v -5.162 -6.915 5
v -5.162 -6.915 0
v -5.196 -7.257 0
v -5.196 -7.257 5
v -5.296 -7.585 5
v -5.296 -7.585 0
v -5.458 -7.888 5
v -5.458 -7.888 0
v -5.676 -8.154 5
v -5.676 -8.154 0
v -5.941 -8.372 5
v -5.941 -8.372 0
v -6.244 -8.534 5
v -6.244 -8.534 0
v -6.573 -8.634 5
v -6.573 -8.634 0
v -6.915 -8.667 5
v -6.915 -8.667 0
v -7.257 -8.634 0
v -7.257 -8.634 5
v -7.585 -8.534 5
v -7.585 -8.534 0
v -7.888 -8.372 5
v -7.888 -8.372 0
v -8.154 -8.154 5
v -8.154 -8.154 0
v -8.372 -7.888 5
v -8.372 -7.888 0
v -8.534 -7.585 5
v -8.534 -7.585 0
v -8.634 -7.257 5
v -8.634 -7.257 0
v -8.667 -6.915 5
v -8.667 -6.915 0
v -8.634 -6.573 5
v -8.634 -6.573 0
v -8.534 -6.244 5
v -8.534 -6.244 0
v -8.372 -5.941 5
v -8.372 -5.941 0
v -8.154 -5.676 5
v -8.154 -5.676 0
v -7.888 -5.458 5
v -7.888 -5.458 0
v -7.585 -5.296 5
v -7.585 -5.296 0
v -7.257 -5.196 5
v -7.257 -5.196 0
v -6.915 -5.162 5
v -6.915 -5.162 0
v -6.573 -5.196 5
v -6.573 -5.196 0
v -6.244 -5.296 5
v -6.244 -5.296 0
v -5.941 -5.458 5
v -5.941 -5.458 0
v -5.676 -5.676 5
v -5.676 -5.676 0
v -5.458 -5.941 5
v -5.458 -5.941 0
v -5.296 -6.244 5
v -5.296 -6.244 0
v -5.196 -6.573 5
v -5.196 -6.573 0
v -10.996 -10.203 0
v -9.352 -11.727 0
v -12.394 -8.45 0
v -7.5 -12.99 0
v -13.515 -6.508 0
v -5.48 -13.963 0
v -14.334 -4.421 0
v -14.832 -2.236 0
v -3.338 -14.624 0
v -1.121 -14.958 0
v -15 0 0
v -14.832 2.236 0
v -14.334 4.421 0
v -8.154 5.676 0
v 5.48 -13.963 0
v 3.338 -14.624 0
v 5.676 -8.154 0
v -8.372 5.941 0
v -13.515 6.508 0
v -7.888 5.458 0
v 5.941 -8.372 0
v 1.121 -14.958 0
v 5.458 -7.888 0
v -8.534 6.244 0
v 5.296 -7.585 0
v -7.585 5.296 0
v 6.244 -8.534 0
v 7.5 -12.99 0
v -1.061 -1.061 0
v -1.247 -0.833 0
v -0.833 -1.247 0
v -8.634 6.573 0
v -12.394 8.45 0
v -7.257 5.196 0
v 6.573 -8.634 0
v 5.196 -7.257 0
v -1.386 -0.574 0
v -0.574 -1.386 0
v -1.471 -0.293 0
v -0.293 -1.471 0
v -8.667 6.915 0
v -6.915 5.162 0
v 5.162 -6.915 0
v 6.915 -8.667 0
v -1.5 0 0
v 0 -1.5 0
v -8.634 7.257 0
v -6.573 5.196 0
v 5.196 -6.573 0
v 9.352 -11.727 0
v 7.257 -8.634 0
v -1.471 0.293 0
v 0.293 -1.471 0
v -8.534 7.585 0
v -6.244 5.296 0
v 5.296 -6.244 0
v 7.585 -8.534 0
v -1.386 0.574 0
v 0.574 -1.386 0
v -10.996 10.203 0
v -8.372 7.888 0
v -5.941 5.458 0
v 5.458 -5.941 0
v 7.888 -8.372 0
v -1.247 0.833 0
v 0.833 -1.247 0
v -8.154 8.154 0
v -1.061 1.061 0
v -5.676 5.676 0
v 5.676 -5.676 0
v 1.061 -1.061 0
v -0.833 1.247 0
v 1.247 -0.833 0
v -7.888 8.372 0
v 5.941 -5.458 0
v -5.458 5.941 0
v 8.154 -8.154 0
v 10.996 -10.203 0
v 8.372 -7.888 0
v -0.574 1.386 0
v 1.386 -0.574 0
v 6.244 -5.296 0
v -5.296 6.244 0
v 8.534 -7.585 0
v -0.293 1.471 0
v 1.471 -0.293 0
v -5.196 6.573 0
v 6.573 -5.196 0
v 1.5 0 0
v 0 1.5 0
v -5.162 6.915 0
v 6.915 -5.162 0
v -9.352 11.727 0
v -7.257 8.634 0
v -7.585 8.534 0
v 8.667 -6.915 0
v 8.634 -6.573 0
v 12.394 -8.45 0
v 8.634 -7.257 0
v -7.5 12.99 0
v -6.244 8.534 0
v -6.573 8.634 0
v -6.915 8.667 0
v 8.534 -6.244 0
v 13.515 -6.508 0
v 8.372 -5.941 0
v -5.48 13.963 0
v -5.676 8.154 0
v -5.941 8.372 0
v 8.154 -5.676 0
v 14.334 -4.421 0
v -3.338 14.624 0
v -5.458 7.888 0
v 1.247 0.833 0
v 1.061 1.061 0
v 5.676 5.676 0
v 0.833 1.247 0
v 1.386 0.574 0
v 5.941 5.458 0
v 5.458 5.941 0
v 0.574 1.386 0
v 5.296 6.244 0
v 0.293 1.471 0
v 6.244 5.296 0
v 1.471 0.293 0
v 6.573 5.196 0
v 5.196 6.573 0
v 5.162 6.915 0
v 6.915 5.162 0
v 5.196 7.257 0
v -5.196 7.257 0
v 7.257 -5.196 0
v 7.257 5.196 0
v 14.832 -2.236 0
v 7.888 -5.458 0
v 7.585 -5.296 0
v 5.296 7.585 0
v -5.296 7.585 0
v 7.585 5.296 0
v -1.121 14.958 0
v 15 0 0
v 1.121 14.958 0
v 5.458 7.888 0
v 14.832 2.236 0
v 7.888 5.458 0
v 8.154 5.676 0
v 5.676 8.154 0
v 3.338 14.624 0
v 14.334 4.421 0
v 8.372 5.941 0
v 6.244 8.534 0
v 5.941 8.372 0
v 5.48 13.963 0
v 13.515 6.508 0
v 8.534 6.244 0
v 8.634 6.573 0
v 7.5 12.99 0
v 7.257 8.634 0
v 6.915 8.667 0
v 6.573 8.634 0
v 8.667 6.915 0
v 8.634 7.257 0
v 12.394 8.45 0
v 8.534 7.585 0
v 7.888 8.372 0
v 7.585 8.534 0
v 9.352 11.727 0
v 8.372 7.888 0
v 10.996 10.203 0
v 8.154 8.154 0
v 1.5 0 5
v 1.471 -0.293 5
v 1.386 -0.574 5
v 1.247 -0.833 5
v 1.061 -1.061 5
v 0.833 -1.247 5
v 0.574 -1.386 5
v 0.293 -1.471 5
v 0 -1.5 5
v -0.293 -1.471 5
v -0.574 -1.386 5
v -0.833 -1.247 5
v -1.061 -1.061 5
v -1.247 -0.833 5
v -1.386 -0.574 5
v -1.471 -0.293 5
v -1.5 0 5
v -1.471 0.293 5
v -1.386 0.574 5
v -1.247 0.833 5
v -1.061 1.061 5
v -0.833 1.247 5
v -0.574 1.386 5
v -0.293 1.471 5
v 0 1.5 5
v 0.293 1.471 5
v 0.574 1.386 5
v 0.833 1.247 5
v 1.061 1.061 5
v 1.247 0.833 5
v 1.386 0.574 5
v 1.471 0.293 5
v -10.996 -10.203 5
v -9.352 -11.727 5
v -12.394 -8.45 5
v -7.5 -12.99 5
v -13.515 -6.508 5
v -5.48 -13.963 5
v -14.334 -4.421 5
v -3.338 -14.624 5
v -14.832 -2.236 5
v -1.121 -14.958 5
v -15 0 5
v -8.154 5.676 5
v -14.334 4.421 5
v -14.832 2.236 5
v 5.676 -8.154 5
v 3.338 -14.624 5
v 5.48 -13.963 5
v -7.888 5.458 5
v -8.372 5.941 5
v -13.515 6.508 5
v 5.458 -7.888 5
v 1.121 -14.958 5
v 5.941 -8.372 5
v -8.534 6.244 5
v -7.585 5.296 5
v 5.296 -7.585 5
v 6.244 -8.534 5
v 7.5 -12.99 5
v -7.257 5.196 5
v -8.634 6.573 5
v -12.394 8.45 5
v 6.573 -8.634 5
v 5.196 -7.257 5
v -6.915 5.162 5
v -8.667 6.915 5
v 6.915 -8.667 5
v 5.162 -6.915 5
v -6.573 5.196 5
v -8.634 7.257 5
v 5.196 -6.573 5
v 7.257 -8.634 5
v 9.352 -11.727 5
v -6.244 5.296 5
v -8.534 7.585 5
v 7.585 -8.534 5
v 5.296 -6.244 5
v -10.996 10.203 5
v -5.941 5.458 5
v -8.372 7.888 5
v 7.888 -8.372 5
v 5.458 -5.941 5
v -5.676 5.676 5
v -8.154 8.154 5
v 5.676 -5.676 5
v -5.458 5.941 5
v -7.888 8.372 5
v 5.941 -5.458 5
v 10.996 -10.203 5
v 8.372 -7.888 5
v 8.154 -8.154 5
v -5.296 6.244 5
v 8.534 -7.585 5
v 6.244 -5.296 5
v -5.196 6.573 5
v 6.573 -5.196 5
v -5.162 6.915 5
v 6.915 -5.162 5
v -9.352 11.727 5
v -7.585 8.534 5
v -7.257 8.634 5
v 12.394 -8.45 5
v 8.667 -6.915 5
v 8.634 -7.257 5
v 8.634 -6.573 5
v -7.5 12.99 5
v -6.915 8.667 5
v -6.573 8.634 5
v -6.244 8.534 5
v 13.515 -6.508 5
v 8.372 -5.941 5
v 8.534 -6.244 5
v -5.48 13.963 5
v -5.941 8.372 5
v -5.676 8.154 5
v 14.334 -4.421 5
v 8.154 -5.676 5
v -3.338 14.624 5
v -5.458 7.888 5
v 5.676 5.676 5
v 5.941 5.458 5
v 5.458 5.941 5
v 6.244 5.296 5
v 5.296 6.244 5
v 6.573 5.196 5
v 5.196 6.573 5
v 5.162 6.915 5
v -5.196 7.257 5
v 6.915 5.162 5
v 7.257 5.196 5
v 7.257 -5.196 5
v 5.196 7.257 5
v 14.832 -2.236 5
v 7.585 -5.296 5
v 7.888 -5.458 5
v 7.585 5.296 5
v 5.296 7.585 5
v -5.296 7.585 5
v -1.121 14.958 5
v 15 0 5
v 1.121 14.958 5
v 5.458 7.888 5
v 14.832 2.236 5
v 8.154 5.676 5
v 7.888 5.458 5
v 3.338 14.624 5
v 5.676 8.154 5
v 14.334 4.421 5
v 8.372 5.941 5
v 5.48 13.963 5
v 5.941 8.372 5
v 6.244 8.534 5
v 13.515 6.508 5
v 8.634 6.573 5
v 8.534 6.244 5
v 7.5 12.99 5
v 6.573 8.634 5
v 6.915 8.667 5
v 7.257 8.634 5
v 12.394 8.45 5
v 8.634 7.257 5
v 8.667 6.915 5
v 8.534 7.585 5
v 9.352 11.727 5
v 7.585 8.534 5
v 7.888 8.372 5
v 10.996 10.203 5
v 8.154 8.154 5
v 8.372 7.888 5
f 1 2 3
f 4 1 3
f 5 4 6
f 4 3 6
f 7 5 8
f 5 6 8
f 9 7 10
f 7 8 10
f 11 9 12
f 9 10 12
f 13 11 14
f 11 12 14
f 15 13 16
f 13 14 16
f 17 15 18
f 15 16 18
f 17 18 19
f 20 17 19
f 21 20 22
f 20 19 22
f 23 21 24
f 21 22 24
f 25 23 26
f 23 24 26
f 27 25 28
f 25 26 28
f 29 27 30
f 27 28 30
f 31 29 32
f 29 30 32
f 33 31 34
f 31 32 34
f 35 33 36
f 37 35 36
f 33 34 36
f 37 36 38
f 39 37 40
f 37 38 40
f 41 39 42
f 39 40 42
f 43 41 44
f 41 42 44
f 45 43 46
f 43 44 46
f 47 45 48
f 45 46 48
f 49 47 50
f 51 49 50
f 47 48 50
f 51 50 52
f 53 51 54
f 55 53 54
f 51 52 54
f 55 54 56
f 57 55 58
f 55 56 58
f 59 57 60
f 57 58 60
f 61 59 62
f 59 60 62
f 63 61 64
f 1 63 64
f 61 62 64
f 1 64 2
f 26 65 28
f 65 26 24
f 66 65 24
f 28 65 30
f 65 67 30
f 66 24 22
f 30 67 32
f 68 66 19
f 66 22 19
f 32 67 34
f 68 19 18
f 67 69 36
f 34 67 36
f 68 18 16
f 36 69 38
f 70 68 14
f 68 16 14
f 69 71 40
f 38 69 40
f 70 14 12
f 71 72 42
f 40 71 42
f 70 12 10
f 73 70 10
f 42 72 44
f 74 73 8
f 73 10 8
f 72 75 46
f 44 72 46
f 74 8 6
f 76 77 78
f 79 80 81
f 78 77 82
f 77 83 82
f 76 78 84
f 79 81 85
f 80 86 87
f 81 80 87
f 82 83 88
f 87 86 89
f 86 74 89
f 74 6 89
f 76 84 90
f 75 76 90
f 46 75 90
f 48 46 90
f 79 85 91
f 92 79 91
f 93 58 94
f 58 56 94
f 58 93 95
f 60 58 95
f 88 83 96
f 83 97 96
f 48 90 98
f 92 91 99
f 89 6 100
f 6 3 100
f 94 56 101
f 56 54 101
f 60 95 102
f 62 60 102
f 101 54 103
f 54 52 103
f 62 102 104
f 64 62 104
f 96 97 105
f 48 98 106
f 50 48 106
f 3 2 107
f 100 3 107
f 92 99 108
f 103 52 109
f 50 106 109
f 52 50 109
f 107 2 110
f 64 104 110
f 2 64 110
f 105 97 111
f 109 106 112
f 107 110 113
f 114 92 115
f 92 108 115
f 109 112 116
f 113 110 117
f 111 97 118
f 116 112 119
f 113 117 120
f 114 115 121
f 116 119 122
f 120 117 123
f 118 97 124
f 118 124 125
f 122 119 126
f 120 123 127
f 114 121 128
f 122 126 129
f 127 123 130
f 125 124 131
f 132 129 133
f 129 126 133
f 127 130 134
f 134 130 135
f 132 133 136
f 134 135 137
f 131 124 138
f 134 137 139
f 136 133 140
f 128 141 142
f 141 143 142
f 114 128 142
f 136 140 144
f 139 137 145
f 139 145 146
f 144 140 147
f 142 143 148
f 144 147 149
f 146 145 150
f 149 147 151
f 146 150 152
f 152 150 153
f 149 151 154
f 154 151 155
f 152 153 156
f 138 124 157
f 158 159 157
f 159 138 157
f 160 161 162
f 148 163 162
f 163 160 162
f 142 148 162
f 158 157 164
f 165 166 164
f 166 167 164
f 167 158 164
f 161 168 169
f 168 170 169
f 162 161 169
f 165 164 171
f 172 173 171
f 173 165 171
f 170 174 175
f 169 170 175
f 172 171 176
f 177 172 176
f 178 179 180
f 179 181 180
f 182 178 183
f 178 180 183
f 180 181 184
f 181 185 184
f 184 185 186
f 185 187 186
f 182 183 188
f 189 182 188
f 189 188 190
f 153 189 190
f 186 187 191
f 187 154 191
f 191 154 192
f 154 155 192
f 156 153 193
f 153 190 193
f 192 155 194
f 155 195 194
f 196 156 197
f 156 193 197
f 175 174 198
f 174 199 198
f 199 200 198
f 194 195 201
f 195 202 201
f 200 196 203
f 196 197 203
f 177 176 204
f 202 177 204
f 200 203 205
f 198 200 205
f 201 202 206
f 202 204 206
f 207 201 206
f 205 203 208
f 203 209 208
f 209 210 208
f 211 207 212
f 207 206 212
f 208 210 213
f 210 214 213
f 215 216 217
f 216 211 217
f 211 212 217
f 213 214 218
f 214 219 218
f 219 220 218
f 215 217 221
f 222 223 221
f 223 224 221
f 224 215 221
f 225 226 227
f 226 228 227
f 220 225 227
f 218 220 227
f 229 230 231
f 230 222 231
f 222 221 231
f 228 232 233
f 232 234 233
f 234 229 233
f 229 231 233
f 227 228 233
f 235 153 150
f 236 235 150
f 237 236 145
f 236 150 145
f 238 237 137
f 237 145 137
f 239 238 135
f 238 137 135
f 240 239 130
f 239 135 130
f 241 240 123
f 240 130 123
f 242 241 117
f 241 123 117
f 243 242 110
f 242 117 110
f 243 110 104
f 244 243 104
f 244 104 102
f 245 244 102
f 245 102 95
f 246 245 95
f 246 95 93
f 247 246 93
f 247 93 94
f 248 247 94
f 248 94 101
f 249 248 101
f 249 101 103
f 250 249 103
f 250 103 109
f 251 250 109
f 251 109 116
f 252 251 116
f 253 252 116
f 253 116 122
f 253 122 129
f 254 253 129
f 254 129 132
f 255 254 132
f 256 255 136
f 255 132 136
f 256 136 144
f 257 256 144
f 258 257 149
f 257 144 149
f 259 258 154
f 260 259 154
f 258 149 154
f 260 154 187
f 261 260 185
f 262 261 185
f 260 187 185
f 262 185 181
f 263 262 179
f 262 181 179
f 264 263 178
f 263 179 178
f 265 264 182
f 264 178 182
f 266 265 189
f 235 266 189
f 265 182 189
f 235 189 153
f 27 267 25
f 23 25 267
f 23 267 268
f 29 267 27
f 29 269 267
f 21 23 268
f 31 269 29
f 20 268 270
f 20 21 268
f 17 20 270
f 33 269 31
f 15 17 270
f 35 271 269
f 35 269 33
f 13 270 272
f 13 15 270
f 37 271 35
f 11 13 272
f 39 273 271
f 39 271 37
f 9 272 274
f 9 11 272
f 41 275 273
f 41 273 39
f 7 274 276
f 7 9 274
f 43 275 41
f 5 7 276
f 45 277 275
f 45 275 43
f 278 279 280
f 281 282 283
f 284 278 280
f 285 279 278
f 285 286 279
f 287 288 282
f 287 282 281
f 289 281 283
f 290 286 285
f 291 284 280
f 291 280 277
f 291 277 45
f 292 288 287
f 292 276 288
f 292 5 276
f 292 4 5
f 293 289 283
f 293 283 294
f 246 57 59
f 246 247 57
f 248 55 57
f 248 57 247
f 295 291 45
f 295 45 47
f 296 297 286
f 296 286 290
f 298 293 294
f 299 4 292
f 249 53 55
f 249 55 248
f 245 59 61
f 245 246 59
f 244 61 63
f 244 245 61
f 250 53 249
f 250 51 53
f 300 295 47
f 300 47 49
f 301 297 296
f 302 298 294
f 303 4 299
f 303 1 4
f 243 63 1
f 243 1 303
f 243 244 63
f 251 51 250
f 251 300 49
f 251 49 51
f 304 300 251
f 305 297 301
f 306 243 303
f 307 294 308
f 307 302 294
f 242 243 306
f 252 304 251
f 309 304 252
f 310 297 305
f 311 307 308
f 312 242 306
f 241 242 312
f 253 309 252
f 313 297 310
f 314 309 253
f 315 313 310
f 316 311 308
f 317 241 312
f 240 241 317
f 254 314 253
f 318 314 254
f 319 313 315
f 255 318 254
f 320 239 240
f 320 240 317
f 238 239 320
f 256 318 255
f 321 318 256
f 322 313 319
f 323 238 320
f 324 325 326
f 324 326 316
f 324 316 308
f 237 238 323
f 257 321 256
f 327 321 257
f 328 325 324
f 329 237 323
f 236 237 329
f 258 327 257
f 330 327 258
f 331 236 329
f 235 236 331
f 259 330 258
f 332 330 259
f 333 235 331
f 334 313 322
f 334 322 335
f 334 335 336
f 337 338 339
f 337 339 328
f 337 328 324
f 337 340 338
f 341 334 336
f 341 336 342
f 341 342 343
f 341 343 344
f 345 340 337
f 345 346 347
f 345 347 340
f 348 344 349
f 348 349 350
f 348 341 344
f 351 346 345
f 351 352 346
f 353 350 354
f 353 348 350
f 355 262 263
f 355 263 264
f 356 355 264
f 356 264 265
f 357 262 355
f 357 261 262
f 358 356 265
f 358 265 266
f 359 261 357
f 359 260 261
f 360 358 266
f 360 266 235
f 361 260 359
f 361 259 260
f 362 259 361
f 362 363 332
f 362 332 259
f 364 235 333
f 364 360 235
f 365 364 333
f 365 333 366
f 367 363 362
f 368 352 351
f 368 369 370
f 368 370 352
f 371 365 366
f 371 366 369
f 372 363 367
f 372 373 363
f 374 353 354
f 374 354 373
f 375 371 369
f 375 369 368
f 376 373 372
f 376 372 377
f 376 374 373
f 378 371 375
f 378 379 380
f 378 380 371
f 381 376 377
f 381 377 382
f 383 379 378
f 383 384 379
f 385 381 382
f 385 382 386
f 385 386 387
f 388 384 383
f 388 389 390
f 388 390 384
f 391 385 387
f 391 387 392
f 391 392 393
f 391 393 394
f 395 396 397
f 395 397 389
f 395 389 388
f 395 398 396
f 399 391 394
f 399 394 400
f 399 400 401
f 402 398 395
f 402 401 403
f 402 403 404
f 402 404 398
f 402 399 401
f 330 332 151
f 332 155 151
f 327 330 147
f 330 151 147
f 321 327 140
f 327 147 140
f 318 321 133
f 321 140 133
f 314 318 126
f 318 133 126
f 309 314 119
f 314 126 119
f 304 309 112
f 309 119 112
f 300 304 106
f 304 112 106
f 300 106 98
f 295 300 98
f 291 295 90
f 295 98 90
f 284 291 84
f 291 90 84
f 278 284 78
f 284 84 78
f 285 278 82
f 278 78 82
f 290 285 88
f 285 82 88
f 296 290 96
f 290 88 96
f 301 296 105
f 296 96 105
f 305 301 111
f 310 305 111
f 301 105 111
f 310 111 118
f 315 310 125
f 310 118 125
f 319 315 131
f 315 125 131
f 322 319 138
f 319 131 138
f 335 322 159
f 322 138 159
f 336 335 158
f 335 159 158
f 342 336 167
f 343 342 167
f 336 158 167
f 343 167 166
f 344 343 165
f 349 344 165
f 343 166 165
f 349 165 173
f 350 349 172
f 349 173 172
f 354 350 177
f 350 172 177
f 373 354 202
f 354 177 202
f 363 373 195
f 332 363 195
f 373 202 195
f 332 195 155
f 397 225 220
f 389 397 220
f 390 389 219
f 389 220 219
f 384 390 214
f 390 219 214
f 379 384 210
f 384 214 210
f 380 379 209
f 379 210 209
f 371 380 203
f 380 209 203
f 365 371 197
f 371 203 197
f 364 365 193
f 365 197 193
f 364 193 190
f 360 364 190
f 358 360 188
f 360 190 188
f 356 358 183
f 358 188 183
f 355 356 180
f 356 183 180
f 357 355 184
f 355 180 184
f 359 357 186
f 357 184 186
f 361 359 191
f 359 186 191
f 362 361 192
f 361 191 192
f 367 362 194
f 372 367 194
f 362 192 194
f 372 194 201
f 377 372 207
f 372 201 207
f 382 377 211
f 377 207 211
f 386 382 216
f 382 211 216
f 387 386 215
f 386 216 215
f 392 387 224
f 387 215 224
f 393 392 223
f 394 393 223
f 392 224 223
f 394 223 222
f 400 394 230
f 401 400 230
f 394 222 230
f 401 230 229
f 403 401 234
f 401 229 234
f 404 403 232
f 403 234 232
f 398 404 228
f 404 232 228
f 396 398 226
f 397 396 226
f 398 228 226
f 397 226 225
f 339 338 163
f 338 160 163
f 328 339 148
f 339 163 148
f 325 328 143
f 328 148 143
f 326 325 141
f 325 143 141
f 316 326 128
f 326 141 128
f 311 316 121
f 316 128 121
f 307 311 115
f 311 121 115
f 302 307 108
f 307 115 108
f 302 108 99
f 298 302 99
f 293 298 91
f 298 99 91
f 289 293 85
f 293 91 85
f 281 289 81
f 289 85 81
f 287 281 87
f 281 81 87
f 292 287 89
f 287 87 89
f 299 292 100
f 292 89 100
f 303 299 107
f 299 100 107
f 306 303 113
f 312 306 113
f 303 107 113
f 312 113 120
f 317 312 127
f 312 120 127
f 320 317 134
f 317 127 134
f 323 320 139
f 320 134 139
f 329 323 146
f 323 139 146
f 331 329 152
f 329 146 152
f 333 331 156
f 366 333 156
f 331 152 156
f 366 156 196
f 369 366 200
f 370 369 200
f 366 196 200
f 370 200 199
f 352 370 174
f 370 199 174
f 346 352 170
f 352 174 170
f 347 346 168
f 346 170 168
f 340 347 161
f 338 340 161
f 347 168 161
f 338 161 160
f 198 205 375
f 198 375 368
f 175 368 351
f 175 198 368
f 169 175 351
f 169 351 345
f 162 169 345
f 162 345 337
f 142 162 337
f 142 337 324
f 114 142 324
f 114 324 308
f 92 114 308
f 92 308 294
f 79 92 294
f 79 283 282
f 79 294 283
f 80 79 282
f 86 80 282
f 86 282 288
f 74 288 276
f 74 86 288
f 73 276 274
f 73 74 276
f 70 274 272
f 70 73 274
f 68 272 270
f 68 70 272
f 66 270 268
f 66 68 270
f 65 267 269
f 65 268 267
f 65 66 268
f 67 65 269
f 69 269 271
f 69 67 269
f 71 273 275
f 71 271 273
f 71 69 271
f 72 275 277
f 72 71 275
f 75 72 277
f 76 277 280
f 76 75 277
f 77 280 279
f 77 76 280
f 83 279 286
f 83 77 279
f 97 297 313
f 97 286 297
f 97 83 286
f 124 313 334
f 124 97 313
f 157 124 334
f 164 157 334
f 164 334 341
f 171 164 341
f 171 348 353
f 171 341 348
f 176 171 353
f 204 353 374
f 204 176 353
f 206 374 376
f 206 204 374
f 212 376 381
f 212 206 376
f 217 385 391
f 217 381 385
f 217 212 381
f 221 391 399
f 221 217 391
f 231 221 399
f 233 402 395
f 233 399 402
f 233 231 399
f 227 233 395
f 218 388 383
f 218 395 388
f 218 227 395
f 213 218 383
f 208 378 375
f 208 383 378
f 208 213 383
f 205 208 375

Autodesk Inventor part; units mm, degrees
ref_plane "YZ Plane" through (0, 0, 0) normal (1, 0, 0) x (0, 1, 0)
ref_plane "XZ Plane" through (0, 0, 0) normal (0, 1, 0) x (-1, 0, 0)
ref_plane "XY Plane" through (0, 0, 0) normal (0, 0, 1) x (1, 0, 0)
sketch "Sketch1" plane through (0, 0, 0) normal (0, 0, 1) x (1, 0, 0)
  circle A0 centre (0, 0) radius 15
  line L0 (-73.4722, 0) -> (96.5278, 0) construction
  line L1 (0, 0) -> (0, 31) construction
  circle A1 centre (0, 0) radius 1.5
  circle A2 centre (-6.9148, 6.9148) radius 1.7526
  line L2 (0, 0) -> (-14.5685, 14.5685) construction
  circle A3 centre (-6.9148, -6.9148) radius 1.7526
  circle A4 centre (6.9148, -6.9148) radius 1.7526
  circle A5 centre (6.9148, 6.9148) radius 1.7526
  point P0 (0, 0)
  dimension "d4" = 30
  dimension "d10" = 3
  dimension "d11" = 3.5052
  dimension "d12" = 45
  dimension "d13" = 6.9148
  dimension "d16" = 360
extrude "Extrusion1" add sketch "Sketch1" along normal blind 5 contours A0 | A1 | A2 | A3 | A4 | A5
extrude "Extrusion2" cut sketch "Sketch1" along normal through all contours A1 | A2 | A3 | A4 | A5
equation "\"BendRadius\" = Thickness"
equation "\"BendReliefWidth\" = Thickness"
equation "\"BendReliefDepth\" = 0.5 * Thickness"
equation "\"CornerReliefSize\" = 4 * Thickness"
equation "\"MinimumRemnant\" = 2 * Thickness"
equation "\"TransitionRadius\" = BendRadius"
equation "\"JacobiRadiusSize\" = Thickness"
equation "\"GapSize\" = Thickness"
equation "\"Thickness\" = 0.5"
properties part number "encoder_spacer"
